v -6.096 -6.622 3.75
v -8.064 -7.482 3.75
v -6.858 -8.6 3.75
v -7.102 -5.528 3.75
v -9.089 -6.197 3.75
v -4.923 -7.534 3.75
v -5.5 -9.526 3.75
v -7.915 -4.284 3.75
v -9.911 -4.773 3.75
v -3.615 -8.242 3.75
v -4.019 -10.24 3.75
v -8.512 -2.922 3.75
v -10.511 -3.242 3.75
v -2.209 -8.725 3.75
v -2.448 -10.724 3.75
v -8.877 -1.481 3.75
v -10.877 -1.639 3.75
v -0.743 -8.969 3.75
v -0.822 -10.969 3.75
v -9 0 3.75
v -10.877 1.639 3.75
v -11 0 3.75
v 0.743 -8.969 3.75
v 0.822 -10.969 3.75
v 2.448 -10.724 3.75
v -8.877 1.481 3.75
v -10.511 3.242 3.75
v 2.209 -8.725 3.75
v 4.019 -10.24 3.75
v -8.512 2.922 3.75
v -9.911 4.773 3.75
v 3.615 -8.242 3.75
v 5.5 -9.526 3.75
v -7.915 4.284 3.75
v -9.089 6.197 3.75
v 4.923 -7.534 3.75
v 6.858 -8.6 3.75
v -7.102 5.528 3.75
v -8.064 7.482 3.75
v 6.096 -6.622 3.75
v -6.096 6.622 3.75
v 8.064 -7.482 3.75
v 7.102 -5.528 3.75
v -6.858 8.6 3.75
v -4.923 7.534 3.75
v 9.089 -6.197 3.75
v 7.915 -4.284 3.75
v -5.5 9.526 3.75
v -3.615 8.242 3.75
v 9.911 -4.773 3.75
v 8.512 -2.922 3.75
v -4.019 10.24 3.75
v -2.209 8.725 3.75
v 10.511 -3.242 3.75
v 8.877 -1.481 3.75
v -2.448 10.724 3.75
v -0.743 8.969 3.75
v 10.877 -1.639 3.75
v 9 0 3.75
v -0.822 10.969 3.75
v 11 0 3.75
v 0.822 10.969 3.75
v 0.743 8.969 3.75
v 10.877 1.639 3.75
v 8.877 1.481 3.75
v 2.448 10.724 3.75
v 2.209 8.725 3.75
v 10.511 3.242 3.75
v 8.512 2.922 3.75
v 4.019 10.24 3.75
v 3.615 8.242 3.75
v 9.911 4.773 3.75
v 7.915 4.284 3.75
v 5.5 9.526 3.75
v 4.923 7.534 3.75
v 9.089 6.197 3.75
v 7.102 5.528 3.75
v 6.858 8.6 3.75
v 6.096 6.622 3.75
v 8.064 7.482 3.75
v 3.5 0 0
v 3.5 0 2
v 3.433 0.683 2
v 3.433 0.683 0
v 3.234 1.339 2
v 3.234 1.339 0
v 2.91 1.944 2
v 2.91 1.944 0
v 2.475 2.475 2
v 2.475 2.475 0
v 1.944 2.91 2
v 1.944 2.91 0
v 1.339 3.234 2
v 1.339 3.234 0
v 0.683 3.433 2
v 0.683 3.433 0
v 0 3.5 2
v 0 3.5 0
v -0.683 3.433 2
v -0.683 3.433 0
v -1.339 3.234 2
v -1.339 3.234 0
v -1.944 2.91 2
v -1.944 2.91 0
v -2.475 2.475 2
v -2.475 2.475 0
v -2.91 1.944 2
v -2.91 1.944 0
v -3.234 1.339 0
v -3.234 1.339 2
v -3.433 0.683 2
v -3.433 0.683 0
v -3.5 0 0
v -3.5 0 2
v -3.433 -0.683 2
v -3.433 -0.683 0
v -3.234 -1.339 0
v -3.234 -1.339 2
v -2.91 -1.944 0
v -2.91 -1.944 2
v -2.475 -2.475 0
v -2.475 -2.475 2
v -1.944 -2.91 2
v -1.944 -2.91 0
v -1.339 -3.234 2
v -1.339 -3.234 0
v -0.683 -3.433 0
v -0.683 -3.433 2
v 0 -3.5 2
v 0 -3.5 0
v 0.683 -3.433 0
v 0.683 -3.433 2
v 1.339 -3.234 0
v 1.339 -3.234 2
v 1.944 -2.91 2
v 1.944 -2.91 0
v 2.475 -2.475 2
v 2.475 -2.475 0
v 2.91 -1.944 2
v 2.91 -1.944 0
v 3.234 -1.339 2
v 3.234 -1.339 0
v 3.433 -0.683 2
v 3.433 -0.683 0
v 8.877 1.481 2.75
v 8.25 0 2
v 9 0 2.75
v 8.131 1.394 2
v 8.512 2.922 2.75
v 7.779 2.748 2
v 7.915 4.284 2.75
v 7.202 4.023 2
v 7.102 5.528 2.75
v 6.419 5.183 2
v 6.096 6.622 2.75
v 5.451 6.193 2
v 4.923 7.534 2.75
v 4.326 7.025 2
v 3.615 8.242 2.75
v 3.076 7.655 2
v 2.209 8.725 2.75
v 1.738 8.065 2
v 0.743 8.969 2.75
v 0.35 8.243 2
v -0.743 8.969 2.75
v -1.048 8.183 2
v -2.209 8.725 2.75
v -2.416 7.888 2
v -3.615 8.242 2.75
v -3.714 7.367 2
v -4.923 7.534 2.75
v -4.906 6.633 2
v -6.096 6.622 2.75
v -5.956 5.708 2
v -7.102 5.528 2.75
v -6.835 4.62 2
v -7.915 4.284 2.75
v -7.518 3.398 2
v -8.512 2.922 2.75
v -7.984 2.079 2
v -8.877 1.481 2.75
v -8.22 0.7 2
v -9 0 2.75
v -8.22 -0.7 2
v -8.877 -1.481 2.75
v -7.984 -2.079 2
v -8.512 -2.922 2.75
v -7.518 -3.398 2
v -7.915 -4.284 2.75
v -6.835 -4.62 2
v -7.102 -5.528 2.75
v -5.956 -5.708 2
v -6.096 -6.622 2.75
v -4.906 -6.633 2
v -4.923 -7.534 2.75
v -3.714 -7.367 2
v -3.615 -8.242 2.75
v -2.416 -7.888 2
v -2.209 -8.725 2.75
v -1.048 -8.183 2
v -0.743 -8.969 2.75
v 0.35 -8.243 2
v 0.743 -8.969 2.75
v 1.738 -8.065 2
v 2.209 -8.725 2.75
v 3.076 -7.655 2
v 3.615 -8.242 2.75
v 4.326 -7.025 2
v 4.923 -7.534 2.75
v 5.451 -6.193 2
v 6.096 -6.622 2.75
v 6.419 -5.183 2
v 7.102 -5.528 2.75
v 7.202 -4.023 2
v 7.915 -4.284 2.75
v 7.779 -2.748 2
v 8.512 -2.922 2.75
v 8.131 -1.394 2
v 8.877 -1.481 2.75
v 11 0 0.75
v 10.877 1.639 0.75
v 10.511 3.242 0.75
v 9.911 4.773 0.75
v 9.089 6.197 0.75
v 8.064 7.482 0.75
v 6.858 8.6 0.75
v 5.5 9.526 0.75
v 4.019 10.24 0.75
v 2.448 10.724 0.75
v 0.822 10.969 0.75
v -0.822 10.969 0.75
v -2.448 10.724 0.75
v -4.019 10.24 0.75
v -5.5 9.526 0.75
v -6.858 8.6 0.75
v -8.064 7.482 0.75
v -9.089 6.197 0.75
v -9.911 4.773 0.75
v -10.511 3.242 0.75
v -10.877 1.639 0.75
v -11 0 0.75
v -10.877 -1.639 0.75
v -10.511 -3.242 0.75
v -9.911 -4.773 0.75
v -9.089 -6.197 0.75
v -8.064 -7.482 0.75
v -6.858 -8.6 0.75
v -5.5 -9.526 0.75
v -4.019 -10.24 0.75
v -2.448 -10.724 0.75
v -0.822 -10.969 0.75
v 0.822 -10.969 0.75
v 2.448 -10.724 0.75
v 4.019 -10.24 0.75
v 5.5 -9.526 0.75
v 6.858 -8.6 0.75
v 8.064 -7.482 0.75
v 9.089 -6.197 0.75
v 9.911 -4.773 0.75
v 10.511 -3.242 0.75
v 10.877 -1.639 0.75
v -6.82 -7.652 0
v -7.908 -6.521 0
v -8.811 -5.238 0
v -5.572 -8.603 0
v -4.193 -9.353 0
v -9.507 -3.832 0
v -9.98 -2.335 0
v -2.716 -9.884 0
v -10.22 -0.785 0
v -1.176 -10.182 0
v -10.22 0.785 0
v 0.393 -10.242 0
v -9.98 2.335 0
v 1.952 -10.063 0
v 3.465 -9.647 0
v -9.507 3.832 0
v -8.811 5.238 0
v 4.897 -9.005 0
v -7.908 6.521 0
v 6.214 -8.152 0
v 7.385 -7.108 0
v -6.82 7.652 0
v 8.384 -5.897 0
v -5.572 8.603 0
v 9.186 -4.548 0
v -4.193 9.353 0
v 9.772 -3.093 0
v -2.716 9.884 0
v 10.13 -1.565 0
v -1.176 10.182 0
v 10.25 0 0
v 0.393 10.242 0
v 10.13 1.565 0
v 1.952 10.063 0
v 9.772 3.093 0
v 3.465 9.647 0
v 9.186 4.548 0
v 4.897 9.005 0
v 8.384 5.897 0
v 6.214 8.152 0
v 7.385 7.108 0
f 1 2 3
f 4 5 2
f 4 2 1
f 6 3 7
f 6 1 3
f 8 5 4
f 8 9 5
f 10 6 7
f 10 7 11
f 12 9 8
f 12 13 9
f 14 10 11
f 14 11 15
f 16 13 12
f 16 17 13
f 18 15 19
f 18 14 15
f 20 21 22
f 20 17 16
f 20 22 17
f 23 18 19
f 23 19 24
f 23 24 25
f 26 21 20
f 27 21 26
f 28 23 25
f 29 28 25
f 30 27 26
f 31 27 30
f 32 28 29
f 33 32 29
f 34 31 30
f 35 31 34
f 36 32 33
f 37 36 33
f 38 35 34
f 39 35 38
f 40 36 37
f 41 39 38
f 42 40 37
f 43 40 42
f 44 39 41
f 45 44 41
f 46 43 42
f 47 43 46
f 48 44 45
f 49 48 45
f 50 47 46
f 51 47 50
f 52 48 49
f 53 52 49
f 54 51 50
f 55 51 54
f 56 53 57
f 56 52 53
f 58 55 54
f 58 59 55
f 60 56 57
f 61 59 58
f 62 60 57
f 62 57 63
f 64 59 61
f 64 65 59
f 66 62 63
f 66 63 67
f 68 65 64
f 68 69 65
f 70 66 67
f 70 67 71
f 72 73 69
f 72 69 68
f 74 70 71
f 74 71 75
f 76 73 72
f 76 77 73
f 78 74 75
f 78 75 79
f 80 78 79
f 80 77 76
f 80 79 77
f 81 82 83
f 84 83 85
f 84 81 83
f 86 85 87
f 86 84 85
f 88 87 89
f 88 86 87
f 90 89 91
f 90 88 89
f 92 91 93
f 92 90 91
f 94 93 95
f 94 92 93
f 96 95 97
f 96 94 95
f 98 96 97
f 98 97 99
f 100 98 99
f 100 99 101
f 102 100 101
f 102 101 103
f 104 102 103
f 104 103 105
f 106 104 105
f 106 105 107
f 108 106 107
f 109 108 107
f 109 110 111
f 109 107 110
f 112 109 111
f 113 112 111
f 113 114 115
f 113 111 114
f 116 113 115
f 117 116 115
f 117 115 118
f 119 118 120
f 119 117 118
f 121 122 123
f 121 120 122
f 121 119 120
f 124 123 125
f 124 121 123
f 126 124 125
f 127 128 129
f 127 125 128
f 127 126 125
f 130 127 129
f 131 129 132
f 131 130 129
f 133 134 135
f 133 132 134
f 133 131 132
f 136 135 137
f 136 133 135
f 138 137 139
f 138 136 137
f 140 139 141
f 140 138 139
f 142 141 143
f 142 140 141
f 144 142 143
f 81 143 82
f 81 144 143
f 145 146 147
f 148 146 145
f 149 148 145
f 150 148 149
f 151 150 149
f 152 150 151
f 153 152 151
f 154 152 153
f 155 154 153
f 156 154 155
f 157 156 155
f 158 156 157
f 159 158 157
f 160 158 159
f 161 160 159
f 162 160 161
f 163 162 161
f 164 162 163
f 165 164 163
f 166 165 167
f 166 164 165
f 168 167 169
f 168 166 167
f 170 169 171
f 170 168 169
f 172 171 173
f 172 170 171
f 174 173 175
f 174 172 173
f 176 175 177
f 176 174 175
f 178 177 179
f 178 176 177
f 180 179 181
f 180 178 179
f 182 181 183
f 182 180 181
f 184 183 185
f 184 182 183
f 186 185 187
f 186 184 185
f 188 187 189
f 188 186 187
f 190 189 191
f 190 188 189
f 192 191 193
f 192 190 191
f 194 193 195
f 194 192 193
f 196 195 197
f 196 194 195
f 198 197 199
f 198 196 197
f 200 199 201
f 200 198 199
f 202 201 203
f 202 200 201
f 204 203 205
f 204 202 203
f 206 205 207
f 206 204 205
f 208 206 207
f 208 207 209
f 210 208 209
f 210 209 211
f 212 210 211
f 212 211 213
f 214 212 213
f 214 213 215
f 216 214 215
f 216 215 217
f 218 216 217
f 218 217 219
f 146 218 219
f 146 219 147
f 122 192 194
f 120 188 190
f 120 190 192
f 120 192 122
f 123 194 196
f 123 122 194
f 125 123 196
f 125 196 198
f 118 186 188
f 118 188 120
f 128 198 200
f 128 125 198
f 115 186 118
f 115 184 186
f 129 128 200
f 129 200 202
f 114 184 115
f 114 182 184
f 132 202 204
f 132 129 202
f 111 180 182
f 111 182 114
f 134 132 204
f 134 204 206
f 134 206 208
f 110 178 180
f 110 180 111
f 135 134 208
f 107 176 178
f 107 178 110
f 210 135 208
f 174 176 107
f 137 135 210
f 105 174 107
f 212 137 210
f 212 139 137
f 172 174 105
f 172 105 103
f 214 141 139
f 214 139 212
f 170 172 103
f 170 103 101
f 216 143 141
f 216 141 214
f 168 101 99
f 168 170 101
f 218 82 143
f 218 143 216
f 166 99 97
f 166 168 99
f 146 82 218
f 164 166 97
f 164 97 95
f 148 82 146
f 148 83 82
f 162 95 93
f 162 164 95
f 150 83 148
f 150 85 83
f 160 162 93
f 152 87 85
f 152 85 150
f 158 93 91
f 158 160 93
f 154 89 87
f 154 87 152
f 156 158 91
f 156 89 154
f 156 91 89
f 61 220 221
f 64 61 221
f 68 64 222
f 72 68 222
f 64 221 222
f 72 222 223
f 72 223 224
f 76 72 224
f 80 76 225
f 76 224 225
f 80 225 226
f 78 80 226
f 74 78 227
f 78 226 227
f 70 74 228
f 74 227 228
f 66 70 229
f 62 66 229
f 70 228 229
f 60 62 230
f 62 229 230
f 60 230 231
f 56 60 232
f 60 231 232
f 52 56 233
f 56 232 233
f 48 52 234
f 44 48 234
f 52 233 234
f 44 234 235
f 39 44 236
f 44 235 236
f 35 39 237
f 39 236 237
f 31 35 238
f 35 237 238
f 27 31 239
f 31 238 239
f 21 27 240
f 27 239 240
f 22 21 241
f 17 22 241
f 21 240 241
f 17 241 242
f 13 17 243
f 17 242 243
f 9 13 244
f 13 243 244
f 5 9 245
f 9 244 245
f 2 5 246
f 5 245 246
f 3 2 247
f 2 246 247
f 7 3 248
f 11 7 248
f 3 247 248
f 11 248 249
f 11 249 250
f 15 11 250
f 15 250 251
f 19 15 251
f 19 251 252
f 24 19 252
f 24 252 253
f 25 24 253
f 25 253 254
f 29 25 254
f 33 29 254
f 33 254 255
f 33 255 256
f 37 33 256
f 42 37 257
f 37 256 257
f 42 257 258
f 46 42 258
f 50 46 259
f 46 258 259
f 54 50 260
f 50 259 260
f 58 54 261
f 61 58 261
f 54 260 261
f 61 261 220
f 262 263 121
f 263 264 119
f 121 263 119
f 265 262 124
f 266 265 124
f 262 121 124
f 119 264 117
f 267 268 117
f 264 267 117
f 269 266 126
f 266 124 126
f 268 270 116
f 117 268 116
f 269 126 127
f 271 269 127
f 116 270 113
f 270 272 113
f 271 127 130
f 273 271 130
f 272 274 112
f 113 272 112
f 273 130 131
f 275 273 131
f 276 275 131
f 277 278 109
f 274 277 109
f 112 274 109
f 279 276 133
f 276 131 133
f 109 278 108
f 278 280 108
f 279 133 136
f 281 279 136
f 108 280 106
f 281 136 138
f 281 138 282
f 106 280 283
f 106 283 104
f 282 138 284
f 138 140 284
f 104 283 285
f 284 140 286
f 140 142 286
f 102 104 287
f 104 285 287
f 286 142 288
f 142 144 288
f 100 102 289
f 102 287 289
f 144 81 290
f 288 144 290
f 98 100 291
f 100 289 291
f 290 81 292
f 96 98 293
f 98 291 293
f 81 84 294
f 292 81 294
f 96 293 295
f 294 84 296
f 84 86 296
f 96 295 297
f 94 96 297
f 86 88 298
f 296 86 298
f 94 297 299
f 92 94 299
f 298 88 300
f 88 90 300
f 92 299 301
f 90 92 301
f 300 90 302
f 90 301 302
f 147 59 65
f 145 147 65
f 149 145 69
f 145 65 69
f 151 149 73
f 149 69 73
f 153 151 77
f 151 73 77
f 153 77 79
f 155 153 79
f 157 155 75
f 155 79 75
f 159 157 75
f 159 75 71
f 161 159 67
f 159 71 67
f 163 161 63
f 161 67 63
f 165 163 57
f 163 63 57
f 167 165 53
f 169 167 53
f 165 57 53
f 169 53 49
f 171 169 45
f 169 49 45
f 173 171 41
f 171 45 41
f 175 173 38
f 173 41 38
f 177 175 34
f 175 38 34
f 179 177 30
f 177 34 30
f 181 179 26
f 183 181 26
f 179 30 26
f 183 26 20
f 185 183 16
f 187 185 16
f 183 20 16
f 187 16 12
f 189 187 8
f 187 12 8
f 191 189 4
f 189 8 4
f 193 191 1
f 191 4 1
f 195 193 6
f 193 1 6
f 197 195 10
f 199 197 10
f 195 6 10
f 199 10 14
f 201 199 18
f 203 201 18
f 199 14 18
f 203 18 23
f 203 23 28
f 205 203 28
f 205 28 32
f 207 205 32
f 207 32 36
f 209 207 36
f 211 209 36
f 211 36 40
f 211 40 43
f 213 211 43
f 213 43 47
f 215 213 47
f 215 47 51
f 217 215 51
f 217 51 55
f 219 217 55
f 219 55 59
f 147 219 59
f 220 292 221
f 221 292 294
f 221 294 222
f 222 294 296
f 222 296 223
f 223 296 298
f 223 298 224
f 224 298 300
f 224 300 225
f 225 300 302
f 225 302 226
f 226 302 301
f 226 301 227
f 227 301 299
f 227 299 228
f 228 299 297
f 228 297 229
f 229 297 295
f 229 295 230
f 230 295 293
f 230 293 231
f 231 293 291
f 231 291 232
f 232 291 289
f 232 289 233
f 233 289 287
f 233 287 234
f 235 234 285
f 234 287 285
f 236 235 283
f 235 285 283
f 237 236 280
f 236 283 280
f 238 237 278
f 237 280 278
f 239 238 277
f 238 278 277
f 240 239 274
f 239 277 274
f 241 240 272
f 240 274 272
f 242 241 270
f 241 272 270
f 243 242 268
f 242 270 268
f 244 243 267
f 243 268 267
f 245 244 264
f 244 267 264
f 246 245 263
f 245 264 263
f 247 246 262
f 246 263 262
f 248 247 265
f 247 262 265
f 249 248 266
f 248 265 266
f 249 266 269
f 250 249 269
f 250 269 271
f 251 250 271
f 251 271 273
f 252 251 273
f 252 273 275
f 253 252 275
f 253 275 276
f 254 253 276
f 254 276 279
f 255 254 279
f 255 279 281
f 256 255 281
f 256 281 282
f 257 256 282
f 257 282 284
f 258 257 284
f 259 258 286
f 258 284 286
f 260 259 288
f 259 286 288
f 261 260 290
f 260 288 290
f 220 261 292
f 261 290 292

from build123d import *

# Parameters (mm, degrees)
SKETCH1_R           = 11
SKETCH1_R_2         = 3.5
BOSS_EXTRUDE1_DEPTH = 3.75
CHAMFER1_SIZE       = 0.75
SKETCH2_R           = 9
CUT_EXTRUDE1_DEPTH  = 1.75
CHAMFER2_SIZE       = 0.75


with BuildPart() as part:
    # Sketch1 → Boss-Extrude1 (new body)
    with BuildSketch(Plane.XY):
        Circle(SKETCH1_R)
        Circle(SKETCH1_R_2, mode=Mode.SUBTRACT)
    extrude(amount=BOSS_EXTRUDE1_DEPTH)

    # Chamfer1
    chamfer1_edges = [part.edges().sort_by_distance(p)[0] for p in [
        (-11, 0, 0),
    ]]
    chamfer(chamfer1_edges, length=CHAMFER1_SIZE)

    # Sketch2 → Cut-Extrude1 (cut)
    with BuildSketch(Plane.XY.offset(3.75)):
        Circle(SKETCH2_R)
    extrude(amount=-CUT_EXTRUDE1_DEPTH, mode=Mode.SUBTRACT)

    # Chamfer2
    chamfer2_edges = [part.edges().sort_by_distance(p)[0] for p in [
        (-9, 0, 2),
    ]]
    chamfer(chamfer2_edges, length=CHAMFER2_SIZE)


solid = part.part
